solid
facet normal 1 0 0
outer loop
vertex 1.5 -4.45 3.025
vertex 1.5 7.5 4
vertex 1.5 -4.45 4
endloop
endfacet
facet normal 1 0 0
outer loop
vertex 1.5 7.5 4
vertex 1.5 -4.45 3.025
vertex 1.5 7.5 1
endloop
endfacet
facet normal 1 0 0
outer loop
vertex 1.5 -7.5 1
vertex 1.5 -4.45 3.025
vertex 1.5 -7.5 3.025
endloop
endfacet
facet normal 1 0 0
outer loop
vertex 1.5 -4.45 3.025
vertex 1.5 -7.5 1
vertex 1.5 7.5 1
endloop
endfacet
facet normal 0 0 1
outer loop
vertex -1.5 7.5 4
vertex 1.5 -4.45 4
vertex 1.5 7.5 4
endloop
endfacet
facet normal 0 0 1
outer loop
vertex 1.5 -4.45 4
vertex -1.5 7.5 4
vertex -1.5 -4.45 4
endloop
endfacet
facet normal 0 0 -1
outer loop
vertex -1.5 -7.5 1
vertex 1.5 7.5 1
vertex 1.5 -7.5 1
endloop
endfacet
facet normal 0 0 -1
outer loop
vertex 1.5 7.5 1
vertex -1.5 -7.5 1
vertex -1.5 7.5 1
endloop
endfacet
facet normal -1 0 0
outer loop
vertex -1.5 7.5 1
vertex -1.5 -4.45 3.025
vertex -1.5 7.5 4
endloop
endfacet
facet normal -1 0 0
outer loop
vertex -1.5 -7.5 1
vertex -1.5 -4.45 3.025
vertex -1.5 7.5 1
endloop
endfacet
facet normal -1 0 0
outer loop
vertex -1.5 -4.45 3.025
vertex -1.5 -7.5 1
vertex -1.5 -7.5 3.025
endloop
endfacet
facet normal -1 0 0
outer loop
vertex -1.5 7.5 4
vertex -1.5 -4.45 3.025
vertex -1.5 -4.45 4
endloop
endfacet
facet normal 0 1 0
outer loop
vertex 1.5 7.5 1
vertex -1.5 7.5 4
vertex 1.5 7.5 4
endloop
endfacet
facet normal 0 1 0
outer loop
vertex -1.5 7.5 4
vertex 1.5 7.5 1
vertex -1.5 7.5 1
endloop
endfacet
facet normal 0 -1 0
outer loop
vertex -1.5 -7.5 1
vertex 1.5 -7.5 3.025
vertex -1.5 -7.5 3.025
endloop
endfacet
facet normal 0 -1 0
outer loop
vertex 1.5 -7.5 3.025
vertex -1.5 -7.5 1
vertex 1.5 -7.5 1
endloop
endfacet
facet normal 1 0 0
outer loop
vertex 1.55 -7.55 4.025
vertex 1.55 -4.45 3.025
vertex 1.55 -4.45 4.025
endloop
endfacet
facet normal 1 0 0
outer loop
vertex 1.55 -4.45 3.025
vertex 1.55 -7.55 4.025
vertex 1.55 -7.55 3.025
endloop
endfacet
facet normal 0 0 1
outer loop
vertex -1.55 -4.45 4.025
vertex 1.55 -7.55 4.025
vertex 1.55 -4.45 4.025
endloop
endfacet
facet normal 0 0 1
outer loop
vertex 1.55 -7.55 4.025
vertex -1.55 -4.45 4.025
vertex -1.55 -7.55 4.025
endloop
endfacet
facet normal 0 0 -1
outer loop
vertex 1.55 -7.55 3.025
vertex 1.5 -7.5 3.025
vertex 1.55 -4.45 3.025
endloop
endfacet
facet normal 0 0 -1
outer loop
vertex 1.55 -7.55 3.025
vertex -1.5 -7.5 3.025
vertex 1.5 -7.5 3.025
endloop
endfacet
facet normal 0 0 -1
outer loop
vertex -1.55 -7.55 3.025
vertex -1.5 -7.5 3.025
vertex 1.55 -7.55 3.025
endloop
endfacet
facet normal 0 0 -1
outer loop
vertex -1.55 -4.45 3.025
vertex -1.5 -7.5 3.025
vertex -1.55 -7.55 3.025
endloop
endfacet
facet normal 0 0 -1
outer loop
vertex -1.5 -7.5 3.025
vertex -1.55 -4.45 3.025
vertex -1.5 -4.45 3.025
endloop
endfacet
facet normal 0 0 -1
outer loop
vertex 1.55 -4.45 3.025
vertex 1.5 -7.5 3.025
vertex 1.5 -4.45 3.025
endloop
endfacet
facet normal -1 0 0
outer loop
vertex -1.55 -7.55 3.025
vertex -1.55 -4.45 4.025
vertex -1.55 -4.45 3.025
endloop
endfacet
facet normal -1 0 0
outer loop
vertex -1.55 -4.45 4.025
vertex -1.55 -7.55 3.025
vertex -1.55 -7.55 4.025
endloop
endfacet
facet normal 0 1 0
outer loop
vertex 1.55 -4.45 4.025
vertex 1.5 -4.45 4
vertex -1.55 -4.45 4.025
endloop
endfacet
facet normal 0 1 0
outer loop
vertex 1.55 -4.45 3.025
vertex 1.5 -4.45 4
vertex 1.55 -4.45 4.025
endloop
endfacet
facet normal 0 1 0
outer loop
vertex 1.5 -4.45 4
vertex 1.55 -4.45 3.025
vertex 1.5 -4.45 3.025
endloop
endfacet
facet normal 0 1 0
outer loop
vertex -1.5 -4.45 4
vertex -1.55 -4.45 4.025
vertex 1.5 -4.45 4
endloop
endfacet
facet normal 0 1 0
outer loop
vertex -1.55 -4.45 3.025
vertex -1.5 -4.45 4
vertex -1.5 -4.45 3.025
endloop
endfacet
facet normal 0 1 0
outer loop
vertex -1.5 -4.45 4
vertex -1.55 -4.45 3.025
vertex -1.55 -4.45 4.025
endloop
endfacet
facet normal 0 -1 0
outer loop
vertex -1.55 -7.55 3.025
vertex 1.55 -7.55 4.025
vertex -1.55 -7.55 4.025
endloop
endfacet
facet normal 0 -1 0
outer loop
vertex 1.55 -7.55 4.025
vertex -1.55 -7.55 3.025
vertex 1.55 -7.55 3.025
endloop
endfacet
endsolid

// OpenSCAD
use <lib.scad>

hd = 72;
ld = 12;

module bodyHD() {
	translate([0,0,2.5]) union() {
		box([3,15,3]);
		translate([0,-6,1.025]) box([3.1,3.1,1]);
	}
}

bodyHD();
